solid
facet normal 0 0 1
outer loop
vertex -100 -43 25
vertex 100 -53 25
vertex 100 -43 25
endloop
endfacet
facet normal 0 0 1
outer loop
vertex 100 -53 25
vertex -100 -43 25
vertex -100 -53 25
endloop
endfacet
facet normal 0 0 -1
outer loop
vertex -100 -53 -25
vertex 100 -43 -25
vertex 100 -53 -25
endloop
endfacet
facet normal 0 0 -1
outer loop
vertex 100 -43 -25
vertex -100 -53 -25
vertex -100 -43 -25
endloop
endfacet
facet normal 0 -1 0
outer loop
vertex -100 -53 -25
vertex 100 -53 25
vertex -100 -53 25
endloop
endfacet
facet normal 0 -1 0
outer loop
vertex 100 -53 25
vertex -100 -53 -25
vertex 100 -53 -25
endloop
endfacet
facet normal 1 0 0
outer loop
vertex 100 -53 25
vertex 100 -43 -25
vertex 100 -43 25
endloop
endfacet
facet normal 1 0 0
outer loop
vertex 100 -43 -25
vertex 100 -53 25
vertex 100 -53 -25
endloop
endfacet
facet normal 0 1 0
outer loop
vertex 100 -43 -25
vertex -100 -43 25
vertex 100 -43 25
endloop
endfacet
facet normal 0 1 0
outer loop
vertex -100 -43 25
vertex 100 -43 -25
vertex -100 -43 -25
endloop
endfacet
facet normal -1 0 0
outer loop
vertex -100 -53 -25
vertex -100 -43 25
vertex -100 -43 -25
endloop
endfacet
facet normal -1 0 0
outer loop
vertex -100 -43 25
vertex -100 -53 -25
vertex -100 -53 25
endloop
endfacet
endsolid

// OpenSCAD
color("white")
	translate([0,-48,0])
		cube([200,10,50], center=true);
